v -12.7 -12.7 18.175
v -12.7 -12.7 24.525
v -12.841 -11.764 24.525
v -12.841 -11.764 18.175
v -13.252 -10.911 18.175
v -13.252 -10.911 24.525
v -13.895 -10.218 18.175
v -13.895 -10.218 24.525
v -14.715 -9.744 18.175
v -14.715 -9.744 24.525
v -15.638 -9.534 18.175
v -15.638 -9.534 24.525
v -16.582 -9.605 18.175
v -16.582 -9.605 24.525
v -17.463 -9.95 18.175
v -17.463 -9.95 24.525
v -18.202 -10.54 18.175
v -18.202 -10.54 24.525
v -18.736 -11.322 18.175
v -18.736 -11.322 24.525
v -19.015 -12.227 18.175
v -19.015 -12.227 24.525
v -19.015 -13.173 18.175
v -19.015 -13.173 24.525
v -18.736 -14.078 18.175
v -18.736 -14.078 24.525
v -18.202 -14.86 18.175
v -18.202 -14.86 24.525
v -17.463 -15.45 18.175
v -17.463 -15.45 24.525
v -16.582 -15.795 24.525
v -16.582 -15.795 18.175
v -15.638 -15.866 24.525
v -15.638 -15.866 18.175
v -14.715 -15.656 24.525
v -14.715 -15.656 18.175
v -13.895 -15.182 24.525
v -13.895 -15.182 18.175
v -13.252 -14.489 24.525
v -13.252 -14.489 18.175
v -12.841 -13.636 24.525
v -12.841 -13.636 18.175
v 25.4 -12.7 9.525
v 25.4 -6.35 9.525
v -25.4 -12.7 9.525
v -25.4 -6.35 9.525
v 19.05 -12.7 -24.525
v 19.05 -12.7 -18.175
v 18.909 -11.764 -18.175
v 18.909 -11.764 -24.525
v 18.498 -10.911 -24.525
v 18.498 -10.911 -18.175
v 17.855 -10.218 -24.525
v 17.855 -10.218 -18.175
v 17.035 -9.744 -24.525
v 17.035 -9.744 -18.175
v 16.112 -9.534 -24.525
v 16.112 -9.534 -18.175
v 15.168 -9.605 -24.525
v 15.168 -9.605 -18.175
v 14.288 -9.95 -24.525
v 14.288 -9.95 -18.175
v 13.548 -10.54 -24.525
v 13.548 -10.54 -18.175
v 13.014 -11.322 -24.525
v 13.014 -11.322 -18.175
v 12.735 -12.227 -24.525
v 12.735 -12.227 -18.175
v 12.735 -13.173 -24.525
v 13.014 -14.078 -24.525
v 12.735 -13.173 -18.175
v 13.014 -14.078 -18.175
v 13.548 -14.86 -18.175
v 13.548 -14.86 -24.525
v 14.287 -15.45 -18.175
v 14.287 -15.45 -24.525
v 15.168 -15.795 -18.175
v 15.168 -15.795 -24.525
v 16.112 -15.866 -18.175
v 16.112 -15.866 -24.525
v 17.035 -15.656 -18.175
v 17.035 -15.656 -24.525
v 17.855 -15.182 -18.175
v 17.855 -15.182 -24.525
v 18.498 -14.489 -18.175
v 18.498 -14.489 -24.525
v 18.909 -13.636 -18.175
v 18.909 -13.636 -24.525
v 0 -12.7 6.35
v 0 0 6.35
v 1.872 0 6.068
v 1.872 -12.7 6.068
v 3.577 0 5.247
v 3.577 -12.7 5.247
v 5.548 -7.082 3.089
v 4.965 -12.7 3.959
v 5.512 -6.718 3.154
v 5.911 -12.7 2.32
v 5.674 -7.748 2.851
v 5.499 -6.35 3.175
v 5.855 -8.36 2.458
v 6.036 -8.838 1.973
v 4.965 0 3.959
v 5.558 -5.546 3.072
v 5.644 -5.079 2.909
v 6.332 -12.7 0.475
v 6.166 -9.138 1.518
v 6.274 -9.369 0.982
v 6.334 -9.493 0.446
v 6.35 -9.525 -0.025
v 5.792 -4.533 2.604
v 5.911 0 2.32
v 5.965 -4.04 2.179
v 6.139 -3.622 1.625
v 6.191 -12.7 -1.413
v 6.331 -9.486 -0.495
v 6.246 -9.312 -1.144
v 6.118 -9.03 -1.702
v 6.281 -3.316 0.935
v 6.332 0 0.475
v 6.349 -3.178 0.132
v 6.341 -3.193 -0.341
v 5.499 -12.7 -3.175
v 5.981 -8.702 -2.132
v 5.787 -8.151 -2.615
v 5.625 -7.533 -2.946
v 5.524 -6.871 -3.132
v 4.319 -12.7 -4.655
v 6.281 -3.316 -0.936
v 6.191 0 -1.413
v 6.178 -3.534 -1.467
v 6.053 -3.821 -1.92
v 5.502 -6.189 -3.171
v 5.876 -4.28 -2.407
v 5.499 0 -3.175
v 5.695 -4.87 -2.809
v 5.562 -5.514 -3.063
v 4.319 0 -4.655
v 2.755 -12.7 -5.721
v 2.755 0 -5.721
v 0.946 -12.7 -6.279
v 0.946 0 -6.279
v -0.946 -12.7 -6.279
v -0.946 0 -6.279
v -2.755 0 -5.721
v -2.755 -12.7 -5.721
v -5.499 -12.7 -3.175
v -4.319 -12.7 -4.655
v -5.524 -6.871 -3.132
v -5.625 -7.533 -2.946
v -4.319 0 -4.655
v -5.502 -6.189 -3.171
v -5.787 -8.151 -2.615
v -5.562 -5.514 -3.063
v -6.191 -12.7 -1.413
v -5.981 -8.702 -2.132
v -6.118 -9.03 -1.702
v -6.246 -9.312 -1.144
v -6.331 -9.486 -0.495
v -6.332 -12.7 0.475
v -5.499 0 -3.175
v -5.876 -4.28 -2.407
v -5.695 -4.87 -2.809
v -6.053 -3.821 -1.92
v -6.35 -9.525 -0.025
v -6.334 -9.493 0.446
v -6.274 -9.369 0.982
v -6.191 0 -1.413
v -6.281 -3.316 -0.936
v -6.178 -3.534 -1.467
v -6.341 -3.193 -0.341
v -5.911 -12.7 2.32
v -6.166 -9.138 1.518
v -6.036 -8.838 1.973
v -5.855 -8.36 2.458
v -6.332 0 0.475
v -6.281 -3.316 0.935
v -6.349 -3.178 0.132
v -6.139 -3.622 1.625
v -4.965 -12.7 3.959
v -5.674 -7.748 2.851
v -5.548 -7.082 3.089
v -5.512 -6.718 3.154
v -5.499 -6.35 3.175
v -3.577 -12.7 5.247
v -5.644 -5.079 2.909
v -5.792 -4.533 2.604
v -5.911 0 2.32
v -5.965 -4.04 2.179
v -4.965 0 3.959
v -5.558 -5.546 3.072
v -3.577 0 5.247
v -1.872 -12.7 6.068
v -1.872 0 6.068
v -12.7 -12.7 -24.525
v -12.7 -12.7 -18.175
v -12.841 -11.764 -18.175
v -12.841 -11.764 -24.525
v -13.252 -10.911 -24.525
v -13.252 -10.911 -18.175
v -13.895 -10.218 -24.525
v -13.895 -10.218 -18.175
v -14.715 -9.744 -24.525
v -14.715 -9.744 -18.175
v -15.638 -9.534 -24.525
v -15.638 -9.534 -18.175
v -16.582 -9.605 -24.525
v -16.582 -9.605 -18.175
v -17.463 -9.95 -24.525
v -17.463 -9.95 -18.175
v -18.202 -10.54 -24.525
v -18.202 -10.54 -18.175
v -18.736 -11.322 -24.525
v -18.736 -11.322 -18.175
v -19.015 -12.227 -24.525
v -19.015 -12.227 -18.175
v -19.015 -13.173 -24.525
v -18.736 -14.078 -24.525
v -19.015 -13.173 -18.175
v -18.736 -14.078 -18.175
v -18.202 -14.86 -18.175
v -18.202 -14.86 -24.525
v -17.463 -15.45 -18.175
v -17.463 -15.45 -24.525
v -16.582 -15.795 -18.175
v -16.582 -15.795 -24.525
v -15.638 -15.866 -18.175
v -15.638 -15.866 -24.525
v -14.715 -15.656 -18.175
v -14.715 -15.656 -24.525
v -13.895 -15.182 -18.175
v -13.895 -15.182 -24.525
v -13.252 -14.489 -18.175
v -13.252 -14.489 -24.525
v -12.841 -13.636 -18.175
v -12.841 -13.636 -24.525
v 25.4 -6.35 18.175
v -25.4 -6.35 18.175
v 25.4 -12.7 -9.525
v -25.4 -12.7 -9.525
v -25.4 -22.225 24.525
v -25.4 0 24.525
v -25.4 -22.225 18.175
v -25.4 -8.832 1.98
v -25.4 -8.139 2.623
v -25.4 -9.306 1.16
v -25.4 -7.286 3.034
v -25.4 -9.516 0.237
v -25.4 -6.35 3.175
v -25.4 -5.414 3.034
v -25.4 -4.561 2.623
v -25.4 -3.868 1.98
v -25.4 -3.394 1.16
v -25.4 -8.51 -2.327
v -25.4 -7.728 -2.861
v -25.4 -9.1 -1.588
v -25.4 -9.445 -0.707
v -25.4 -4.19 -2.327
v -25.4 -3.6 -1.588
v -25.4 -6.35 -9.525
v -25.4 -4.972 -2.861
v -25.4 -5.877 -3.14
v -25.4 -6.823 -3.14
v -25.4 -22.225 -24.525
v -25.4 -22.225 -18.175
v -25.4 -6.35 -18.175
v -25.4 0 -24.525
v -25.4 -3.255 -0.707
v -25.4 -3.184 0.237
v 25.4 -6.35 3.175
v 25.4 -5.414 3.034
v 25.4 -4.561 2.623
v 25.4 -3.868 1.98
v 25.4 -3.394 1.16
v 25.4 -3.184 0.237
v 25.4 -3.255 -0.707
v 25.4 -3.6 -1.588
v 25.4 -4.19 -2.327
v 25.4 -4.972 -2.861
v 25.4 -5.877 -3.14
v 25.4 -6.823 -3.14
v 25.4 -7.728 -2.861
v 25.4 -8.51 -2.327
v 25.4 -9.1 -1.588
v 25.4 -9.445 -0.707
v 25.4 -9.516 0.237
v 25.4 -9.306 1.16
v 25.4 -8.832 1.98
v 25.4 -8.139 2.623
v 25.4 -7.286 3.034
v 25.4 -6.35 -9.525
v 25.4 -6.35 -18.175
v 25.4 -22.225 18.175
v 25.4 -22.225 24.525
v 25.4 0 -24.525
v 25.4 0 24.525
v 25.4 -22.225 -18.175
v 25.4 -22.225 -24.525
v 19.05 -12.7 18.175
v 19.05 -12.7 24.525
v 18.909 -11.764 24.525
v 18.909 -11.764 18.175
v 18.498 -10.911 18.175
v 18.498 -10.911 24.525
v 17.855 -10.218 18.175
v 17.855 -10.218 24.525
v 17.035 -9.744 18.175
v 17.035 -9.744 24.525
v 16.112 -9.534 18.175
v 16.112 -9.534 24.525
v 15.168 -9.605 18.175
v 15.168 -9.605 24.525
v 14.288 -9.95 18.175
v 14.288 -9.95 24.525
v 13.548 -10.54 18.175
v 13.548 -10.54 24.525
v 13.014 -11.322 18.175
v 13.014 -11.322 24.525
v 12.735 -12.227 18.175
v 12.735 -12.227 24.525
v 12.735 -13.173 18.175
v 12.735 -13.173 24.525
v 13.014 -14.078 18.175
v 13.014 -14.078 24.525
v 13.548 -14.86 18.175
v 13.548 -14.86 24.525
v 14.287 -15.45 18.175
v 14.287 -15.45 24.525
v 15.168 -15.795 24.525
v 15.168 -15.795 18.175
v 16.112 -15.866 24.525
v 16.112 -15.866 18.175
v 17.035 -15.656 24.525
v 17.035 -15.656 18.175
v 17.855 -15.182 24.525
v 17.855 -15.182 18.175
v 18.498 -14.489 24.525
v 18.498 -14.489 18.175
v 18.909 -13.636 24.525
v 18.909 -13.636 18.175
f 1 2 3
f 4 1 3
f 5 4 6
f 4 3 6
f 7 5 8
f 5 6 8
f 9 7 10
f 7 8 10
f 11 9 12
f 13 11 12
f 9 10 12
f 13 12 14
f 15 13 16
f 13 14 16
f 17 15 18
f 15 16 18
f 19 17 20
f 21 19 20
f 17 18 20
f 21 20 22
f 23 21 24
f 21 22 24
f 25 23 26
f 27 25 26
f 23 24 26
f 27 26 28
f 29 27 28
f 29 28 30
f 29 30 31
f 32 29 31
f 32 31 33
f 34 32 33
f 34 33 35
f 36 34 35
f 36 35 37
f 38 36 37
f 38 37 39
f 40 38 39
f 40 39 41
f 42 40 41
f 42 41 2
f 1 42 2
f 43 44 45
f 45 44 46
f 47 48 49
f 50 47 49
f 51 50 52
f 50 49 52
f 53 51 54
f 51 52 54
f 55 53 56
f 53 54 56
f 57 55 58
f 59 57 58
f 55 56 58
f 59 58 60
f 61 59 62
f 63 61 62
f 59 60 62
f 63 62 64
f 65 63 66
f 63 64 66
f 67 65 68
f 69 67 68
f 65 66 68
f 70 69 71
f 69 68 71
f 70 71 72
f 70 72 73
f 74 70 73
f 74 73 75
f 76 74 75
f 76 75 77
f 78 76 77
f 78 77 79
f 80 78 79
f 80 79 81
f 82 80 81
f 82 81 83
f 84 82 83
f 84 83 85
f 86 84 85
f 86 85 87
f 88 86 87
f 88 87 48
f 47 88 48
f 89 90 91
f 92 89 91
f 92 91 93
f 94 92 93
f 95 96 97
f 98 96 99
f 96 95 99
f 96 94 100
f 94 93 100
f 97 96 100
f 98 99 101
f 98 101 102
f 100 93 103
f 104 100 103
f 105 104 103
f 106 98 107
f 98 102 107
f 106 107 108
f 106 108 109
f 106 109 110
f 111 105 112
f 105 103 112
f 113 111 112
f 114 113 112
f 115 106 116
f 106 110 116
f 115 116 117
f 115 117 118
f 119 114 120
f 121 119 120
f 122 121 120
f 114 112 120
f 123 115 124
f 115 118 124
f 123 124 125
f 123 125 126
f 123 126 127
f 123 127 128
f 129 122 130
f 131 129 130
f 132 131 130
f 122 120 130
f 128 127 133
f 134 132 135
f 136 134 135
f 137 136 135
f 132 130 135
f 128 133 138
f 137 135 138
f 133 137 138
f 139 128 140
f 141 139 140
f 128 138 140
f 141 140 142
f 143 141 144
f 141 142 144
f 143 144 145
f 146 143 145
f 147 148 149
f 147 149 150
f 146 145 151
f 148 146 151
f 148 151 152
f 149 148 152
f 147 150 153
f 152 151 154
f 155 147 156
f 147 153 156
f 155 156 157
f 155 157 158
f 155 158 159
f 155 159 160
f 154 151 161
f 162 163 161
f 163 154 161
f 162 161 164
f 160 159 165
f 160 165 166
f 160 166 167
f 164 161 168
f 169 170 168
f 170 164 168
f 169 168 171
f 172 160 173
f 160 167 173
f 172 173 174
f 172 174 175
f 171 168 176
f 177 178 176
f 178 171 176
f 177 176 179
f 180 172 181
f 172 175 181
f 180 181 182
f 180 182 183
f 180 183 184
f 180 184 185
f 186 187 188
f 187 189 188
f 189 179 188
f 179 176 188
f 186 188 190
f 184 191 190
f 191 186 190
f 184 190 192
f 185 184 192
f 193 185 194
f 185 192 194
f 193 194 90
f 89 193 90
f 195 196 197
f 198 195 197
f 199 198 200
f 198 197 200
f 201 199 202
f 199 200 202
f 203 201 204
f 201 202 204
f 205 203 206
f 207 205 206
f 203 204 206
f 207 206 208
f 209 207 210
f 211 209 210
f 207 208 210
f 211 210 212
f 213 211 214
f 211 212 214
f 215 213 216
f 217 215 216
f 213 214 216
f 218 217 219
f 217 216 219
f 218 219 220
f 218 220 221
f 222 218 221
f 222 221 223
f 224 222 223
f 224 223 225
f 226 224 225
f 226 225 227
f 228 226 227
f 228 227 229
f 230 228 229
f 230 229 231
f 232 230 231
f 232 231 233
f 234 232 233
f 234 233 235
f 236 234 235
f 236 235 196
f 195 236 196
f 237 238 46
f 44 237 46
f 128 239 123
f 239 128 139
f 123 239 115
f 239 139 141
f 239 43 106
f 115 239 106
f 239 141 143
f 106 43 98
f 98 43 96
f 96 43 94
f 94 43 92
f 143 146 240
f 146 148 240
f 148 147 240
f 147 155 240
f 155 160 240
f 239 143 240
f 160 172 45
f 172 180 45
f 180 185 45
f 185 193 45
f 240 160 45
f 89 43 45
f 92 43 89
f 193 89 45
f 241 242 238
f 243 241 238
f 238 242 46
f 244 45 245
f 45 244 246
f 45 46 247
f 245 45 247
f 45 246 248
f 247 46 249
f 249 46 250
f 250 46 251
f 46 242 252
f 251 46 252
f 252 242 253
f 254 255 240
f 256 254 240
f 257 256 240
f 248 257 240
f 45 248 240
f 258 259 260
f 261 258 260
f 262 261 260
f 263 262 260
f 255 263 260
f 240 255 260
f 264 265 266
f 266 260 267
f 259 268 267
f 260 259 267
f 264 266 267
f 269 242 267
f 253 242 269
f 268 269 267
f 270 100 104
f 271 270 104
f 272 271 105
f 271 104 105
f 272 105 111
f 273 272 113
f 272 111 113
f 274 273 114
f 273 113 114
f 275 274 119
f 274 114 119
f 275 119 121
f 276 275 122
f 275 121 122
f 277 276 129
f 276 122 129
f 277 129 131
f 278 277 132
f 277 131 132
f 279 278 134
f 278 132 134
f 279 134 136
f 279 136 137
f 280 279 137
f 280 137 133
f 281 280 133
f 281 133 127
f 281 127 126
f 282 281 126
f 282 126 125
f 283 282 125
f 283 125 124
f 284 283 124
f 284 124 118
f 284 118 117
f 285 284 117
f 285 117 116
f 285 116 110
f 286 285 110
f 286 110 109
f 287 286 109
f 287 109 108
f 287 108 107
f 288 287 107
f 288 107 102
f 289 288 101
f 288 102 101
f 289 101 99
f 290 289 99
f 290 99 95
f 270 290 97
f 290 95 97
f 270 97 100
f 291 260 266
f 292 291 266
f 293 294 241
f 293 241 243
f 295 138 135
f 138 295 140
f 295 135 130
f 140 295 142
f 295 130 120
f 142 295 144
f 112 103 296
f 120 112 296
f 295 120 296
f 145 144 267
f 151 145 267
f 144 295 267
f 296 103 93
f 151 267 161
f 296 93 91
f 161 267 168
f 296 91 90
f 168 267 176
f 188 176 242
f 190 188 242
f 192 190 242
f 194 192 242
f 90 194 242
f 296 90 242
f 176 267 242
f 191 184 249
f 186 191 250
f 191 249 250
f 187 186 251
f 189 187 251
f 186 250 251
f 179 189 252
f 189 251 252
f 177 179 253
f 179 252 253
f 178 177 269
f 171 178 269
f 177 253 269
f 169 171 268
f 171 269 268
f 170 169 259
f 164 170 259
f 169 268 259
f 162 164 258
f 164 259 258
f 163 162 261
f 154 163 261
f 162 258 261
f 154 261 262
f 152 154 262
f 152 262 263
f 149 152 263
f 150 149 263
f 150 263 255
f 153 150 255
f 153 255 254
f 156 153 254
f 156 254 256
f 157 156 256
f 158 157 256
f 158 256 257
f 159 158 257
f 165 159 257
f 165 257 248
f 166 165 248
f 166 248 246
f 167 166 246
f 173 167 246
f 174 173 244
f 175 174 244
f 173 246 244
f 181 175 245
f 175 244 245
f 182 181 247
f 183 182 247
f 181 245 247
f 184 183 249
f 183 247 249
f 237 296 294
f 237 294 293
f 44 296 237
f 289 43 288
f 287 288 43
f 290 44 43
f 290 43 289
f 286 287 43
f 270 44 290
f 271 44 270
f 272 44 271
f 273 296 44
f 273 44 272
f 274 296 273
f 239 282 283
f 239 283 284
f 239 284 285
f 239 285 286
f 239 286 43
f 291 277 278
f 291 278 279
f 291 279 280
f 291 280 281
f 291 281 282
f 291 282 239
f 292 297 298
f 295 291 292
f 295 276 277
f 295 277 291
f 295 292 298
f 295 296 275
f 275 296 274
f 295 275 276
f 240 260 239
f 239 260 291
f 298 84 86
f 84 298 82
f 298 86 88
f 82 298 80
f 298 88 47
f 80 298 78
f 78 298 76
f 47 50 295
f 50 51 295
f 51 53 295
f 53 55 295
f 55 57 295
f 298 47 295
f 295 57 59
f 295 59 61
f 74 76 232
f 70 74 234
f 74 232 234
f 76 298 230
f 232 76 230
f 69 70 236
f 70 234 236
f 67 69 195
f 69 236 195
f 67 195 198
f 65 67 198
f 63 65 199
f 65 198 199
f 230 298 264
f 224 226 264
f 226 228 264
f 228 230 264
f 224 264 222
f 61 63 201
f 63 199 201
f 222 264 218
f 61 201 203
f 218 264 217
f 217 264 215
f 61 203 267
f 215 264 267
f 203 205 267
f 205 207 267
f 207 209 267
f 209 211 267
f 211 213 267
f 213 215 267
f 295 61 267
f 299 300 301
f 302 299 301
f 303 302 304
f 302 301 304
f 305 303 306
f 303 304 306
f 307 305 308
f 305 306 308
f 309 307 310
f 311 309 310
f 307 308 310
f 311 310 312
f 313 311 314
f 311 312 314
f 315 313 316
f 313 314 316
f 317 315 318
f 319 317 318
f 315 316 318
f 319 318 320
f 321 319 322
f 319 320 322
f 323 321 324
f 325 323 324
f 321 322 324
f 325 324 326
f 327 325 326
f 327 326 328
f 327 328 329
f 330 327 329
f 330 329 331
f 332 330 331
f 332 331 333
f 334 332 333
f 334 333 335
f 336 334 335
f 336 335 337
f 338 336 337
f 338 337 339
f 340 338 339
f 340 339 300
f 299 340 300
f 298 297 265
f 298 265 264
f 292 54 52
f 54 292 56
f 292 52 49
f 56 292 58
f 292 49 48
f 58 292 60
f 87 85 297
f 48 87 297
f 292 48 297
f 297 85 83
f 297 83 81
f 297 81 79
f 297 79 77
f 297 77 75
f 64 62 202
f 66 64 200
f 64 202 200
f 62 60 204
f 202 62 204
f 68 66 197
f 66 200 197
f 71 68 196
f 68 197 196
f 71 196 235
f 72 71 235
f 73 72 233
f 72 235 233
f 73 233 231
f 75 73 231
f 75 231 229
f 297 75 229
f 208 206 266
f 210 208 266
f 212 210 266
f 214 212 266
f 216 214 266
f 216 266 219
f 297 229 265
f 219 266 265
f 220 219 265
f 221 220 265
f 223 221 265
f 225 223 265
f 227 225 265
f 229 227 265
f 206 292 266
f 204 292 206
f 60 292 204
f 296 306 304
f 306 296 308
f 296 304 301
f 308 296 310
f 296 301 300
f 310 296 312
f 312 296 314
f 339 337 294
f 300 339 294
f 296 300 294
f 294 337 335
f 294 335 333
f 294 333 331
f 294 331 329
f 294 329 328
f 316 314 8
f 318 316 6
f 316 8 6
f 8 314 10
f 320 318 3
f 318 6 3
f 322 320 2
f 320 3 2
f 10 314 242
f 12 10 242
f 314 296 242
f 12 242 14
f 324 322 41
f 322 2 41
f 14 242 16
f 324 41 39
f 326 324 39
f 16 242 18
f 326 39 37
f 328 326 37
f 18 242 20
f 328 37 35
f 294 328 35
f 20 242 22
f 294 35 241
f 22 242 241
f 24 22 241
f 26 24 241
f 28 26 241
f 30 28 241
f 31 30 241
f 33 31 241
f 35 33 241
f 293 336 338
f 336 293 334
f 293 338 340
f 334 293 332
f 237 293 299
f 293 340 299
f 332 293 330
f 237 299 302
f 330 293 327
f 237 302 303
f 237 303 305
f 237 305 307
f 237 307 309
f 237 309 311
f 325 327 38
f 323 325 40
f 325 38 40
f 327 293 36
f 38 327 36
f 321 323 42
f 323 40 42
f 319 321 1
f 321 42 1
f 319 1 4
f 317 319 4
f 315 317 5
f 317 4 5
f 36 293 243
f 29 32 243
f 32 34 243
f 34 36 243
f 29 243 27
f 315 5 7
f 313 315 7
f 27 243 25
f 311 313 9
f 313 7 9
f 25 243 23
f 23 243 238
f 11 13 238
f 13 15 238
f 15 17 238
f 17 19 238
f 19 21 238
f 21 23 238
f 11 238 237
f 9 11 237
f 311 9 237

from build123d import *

# Parameters (mm, degrees)
BOSS_EXTRUDE2_DEPTH      = 25.4
BOSS_EXTRUDE2_DEPTH_BACK = 25.4
SKETCH3_R                = 3.175
CUT_EXTRUDE1_DEPTH       = 50.8
BOSS_EXTRUDE3_DEPTH      = 6.35
SKETCH4_R                = 6.35
CUT_EXTRUDE2_DEPTH       = 50.8
SKETCH8_R                = 3.175
CUT_EXTRUDE3_DEPTH       = 61.630559774


with BuildPart() as part:
    # Sketch1 → Boss-Extrude2 (new, two sides: drawn at the far end of the back side and taken through both)
    with BuildSketch(Plane(origin=(0, 0, 0), x_dir=(0, 0, -1), z_dir=(1, 0, 0)).offset(-BOSS_EXTRUDE2_DEPTH_BACK)):
        Polygon((18.17497, -22.225), (24.52497, -22.225), (24.52497, 0), (-24.52497, 0), (-24.52497, -22.225), (-18.17497, -22.225), (-18.17497, -6.35), (18.17497, -6.35), align=None)
    extrude(amount=BOSS_EXTRUDE2_DEPTH + BOSS_EXTRUDE2_DEPTH_BACK)

    # Sketch3 → Cut-Extrude1 (cut)
    with BuildSketch(Plane.XY.offset(24.52497)):
        with Locations((-15.875, -12.7)):
            Circle(SKETCH3_R)
        with Locations((15.875, -12.7)):
            Circle(SKETCH3_R)
    extrude(amount=-CUT_EXTRUDE1_DEPTH, mode=Mode.SUBTRACT)

    # Sketch7 → Boss-Extrude3 (add)
    with BuildSketch(Plane.XZ.offset(6.35)):
        Polygon((-25.4, 9.525), (0, 9.525), (25.4, 9.525), (25.4, -9.525), (-1.632648861, -9.525), (-25.4, -9.525), align=None)
    extrude(amount=BOSS_EXTRUDE3_DEPTH)

    # Sketch4 → Cut-Extrude2 (cut)
    with BuildSketch(Plane(origin=(0, 0, 0), x_dir=(1, 0, 0), z_dir=(0, 1, 0))):
        Circle(SKETCH4_R)
    extrude(amount=-CUT_EXTRUDE2_DEPTH, mode=Mode.SUBTRACT)

    # Sketch8 → Cut-Extrude3 (cut, through all)
    with BuildSketch(Plane.ZY.offset(25.4)):
        with Locations((0, -6.35)):
            Circle(SKETCH8_R)
    extrude(amount=-CUT_EXTRUDE3_DEPTH, mode=Mode.SUBTRACT)


solid = part.part
